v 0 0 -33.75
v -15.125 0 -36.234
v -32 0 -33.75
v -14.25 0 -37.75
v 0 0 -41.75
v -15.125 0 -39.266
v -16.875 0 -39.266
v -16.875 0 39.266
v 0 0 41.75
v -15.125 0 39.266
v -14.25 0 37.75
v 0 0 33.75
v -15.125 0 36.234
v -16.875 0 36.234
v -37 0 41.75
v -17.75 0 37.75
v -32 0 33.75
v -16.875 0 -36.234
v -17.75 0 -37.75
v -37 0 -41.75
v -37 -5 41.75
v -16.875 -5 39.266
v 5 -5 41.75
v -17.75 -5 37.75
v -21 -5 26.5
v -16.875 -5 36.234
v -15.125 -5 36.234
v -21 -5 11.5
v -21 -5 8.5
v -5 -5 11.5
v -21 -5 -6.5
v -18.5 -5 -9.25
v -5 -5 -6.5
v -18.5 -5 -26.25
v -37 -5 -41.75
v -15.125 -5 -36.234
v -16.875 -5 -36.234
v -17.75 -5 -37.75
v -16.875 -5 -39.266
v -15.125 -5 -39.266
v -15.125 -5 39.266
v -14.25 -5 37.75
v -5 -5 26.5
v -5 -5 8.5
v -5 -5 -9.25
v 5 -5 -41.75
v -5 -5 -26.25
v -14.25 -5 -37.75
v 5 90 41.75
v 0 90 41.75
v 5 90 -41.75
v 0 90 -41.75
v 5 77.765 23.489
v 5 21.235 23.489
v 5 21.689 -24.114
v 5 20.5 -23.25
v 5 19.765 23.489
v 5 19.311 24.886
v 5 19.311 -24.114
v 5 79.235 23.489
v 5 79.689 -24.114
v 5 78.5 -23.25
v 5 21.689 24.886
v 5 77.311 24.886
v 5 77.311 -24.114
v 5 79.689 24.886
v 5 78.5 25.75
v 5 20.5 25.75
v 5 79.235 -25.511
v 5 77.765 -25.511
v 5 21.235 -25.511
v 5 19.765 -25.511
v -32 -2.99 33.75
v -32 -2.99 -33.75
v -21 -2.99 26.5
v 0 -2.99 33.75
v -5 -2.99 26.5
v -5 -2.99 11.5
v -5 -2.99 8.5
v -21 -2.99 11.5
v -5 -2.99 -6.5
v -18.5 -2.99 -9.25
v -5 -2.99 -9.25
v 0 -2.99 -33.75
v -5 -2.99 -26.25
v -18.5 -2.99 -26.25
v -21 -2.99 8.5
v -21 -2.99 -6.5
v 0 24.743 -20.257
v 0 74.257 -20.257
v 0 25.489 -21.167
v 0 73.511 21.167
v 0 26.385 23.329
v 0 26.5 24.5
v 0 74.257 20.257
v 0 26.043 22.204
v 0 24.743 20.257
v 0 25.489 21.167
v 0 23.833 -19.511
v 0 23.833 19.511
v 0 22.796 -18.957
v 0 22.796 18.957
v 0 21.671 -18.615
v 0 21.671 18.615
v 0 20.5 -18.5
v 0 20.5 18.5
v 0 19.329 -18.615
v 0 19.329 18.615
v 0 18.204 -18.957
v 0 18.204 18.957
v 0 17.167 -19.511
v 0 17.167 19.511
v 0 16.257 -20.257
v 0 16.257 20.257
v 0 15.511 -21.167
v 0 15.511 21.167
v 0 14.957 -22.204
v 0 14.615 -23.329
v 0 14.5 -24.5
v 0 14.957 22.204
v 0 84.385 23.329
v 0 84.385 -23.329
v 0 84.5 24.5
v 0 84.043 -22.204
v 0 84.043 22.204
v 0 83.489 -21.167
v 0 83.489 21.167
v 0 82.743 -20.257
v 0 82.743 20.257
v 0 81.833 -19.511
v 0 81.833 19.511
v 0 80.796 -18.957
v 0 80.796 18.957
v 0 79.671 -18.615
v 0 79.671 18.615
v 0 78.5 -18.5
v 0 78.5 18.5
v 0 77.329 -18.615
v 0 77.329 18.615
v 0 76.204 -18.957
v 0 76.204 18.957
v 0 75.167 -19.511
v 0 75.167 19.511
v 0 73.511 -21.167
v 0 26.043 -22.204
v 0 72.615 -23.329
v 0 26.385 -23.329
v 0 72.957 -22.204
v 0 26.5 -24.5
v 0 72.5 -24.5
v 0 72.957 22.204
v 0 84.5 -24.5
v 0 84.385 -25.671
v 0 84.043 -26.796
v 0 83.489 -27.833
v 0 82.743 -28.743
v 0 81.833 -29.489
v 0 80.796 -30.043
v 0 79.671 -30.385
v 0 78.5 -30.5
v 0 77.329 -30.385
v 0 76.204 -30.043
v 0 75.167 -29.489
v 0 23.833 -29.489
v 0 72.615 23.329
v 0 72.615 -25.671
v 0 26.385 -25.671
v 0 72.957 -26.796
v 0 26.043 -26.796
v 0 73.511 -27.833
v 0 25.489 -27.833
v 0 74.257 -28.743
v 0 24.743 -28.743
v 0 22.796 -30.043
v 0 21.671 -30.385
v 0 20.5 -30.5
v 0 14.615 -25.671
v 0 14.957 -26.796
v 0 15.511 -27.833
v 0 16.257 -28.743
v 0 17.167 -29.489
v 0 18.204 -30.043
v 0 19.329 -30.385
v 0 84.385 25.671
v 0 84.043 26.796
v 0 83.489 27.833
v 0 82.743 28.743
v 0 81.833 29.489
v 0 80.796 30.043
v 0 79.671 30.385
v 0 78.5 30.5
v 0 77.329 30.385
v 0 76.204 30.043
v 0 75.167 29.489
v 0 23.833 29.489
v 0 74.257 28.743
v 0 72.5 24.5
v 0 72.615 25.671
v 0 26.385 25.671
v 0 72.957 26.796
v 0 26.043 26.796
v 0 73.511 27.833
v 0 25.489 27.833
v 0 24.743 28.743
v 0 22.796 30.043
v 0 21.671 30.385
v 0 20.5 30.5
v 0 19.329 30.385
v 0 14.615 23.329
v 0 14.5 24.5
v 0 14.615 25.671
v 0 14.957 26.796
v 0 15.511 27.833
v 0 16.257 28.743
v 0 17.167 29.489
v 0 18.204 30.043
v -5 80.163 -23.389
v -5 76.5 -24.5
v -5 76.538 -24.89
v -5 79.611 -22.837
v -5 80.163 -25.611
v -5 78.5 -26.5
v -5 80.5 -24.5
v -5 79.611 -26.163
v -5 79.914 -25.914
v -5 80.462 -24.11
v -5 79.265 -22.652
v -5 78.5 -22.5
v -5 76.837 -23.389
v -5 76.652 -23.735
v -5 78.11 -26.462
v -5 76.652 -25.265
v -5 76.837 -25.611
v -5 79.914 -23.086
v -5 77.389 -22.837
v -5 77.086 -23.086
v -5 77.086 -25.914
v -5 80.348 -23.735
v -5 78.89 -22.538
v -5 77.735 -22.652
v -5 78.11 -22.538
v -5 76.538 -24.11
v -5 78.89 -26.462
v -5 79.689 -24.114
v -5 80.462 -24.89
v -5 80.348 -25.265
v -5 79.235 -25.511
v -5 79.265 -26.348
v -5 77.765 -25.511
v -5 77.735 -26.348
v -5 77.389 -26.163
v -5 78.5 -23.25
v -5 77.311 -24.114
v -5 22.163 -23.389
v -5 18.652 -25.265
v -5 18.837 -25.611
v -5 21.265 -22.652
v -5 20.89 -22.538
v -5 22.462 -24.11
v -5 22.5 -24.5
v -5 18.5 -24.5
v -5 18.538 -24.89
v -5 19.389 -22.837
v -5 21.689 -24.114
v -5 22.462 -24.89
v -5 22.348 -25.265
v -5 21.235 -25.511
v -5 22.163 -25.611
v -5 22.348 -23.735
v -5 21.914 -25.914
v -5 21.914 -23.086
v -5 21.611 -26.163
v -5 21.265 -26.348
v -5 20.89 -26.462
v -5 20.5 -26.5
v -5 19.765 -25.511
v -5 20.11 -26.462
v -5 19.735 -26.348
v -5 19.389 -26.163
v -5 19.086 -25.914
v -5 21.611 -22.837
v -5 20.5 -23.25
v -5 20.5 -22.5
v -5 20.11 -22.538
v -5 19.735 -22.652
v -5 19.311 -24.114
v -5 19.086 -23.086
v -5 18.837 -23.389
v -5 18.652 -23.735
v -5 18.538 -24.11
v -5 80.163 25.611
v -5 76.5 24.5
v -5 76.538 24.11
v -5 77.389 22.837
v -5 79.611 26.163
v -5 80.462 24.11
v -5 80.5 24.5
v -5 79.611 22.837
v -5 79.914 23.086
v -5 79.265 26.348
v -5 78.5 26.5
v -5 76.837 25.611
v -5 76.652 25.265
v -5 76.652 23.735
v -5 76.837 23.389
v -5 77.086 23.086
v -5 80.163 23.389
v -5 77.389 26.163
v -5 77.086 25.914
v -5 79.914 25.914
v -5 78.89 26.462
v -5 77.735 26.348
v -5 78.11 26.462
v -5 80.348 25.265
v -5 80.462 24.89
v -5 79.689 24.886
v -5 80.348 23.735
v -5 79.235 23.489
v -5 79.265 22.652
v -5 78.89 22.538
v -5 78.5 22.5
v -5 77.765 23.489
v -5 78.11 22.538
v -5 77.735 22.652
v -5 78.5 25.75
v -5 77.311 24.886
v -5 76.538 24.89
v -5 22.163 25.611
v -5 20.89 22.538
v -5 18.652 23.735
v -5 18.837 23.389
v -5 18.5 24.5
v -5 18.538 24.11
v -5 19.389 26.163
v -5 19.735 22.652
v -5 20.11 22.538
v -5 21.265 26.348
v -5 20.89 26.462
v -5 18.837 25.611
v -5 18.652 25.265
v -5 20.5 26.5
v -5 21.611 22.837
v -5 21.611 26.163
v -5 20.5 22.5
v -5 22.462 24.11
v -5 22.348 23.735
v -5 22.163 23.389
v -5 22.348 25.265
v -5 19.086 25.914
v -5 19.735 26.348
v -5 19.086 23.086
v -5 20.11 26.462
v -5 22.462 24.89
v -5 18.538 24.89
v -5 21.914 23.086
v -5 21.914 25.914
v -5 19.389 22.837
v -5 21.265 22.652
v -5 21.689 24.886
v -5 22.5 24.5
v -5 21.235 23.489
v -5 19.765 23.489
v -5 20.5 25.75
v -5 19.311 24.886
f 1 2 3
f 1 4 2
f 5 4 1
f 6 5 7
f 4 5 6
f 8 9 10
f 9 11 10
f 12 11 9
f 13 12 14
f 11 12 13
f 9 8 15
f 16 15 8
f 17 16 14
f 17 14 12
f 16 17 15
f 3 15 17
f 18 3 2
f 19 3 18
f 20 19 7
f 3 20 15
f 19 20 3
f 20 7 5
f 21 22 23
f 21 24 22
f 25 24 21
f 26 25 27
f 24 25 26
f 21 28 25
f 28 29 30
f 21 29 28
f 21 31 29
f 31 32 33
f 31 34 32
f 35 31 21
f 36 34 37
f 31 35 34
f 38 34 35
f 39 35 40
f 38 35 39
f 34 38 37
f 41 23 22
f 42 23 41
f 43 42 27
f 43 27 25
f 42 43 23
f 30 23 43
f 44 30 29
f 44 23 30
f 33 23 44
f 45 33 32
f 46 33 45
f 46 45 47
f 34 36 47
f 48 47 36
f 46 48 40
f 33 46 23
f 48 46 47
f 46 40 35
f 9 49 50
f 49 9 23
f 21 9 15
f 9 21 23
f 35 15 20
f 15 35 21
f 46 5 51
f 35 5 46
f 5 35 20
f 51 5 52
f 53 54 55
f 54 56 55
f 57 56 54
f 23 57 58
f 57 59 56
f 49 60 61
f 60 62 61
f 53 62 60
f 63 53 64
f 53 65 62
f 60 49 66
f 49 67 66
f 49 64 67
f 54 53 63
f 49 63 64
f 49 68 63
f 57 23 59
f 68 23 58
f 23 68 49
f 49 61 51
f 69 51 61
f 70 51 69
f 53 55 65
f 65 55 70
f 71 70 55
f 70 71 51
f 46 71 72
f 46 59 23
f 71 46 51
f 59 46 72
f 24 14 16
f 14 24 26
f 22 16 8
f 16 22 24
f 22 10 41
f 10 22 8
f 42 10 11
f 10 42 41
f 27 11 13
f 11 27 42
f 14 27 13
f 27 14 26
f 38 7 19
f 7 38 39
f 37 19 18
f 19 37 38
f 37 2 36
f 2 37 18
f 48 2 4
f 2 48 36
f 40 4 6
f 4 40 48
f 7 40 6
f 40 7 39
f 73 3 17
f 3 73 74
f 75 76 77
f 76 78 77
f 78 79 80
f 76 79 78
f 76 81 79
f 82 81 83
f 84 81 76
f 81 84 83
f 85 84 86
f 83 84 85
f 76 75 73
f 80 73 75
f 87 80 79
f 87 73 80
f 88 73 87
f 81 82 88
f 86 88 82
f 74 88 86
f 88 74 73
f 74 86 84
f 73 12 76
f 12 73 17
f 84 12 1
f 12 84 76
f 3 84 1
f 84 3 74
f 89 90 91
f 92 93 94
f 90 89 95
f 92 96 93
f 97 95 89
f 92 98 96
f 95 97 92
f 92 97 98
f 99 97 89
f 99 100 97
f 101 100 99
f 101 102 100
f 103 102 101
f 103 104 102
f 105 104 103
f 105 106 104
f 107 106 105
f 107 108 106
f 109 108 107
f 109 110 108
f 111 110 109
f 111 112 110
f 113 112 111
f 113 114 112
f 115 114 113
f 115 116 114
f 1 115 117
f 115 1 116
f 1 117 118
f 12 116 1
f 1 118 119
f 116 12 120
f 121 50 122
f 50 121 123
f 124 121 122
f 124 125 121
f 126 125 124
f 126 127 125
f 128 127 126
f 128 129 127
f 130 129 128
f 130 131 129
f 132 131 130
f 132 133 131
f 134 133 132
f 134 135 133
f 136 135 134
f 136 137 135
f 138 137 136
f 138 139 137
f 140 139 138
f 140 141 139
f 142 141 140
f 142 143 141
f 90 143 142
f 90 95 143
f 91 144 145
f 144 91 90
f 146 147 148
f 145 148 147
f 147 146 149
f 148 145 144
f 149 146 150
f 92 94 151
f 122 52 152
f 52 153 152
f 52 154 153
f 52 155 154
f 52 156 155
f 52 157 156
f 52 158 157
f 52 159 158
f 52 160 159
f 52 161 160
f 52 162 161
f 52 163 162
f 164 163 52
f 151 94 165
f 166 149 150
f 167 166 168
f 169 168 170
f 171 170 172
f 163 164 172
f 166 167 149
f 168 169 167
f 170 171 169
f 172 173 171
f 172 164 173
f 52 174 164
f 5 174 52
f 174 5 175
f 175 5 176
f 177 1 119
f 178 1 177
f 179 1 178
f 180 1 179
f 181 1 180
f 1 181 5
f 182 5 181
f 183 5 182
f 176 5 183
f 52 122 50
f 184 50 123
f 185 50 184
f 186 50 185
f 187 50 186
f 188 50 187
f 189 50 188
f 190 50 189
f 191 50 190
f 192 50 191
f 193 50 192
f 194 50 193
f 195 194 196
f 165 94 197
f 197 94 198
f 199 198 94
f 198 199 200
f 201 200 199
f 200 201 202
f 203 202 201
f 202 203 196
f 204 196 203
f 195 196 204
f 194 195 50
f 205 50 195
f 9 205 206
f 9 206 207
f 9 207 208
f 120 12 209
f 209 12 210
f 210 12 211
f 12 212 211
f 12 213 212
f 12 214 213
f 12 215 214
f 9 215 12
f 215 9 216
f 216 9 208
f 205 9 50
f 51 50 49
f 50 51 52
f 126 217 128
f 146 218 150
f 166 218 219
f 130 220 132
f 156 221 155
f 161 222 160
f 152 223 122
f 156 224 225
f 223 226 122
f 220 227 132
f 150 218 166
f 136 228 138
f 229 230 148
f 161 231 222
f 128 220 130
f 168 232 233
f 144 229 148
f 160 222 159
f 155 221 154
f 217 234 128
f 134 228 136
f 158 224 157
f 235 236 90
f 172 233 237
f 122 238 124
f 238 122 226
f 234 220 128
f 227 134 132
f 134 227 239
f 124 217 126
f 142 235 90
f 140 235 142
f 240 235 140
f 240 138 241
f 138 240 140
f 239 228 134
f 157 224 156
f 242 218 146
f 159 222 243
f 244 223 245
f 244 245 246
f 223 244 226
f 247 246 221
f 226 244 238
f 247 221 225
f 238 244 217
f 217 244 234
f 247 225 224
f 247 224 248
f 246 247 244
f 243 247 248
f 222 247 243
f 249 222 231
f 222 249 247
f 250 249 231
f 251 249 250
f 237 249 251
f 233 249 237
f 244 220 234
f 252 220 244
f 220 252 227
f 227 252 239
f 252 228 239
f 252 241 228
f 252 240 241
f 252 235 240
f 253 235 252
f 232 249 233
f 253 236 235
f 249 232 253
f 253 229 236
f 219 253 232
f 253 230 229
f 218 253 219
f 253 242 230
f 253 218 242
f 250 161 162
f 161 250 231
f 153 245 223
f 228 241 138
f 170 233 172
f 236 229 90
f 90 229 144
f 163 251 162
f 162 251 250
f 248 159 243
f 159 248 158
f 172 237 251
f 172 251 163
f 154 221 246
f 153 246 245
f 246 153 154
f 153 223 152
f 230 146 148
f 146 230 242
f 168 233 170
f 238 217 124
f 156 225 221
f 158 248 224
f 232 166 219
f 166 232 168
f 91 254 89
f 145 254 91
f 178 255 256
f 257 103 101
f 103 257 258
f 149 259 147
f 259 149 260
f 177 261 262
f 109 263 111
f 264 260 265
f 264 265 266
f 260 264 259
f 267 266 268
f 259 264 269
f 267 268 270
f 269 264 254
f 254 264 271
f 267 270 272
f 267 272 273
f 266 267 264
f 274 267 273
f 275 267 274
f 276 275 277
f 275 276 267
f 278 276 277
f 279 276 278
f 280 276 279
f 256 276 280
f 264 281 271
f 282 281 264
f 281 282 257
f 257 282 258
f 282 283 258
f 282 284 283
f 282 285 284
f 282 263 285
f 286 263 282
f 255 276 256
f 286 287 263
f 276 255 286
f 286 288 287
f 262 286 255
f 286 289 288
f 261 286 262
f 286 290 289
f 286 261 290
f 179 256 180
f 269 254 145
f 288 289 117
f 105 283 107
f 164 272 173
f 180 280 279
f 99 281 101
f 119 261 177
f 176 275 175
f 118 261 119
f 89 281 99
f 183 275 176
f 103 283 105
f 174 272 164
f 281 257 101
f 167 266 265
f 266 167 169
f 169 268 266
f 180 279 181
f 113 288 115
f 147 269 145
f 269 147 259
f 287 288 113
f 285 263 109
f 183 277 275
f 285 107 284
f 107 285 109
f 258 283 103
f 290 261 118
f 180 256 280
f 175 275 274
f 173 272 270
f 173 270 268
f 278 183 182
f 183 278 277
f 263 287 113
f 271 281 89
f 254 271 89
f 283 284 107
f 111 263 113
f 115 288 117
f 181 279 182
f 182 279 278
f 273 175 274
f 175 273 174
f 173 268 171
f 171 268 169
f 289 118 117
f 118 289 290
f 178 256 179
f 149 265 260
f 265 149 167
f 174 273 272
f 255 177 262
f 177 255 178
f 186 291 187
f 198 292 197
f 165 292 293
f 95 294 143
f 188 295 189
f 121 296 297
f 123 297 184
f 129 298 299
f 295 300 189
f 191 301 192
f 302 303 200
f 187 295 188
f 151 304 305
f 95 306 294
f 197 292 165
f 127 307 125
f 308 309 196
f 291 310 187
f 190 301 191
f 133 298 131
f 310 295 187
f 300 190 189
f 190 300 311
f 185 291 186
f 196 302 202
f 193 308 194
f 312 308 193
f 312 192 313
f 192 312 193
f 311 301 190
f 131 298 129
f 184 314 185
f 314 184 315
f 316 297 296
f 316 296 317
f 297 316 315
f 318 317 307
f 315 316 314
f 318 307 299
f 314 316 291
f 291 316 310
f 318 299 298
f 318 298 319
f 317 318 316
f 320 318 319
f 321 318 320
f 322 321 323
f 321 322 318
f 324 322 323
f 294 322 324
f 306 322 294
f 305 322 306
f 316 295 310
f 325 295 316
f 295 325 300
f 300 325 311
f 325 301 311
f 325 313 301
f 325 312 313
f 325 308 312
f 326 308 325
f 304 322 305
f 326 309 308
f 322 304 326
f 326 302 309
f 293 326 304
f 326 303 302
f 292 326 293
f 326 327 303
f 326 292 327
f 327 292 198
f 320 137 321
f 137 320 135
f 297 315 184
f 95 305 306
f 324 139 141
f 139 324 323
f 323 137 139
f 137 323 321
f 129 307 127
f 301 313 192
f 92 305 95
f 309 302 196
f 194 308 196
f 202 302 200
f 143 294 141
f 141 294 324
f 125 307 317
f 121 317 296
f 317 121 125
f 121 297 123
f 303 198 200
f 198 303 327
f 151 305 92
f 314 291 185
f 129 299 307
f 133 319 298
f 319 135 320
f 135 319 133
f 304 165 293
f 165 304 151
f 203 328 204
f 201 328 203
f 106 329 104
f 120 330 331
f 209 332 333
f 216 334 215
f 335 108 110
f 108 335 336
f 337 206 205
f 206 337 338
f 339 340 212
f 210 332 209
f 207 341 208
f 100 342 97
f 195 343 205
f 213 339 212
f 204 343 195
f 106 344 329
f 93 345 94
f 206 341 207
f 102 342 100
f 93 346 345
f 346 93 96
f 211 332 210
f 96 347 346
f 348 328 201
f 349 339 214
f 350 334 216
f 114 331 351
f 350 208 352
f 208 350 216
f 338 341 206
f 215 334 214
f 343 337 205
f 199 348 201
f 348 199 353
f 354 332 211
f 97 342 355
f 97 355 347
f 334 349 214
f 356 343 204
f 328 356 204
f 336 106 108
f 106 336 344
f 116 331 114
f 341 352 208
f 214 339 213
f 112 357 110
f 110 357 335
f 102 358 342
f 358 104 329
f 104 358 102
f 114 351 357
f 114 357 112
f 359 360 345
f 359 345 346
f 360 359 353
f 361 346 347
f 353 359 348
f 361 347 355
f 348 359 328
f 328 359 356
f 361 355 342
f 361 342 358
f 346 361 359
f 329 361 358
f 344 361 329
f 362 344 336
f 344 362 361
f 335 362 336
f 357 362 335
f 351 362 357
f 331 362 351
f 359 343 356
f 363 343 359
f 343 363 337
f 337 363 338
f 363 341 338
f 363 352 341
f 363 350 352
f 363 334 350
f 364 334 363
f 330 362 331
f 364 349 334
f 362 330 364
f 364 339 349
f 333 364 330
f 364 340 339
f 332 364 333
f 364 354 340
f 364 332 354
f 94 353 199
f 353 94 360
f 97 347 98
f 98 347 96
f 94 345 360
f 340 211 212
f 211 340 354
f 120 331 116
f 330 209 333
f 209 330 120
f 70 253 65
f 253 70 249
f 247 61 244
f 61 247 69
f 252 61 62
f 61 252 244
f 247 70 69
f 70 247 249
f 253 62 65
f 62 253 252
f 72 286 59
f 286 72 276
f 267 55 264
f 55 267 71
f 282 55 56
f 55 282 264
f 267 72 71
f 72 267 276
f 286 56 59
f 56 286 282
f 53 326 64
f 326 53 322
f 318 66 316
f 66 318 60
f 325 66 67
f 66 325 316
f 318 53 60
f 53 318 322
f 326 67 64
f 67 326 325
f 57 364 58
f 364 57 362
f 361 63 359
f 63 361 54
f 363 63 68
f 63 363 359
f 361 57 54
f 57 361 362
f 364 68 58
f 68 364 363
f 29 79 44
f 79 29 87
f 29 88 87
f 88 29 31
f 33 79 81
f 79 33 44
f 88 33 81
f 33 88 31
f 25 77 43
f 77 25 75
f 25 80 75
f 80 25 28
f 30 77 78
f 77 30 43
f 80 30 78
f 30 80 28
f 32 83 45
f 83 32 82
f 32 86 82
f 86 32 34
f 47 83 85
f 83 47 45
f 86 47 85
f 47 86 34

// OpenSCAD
// file: blank.scad
include <common.scad>

module Blank(front_thickness=5, recess_size=[segment_width - 10, segment_height - 16], recess_depth=3)
{
  color("red")
  {
    rotate([90, 0, 0])
    {
      difference()
      {
        linear_extrude(front_thickness)
        {
          FrontProjection();
        }

        translate([0, 0, -0.01])
        {
          linear_extrude(recess_depth)
          {
            square(recess_size, center=true);
          }
        }
      }
    }
  }
}

Blank();
// file: common.scad
segment_width = 42;
segment_height = 83.5;

mounting_hole_centres = 75.5;
mounting_hole_diameter = 3.5;

module FrontProjection()
{
  difference()
  {
    square([segment_width, segment_height], center=true);

    for(y = [-mounting_hole_centres/2, mounting_hole_centres/2])
    {
      translate([0, y])
      {
        circle(d=mounting_hole_diameter);
      }
    }
  }
}

module Standoff(lower_diameter, upper_diameter, height)
{
  hull()
  {
    translate([0, 0, -1])
    {
      cylinder(d=lower_diameter, h=1, $fn=32);
    }

    translate([0, 0, height - 1])
    {
      cylinder(d=upper_diameter, h=1, $fn=32);
    }
  }
}
// file: blank_with_mounting_plate.scad
include <common.scad>
use <blank.scad>

module BlankWithMountingPlate(front_thickness=5, plate_thickness=5, plate_depth=120, recess_size=[segment_width - 10, segment_height - 16], recess_depth=3)
{
  translate([-(segment_width / 2) + plate_thickness, 0, 0])
  {
    Blank(front_thickness, recess_size, recess_depth);
  }

  color("green")
  {
    translate([plate_thickness / 2, 0, 0])
    {
      rotate([-90, 0, 0])
      {
        linear_extrude(plate_depth)
        {
          square([plate_thickness, segment_height], center=true);
        }
      }
    }
  }
}

BlankWithMountingPlate();
// main file
use <blank_with_mounting_plate.scad>

board_size = [56, 85];
front_panel_recess = 3;

module PlaceMountingHoles()
{
  translate([-board_size[0]/2, -front_panel_recess])
  {
    translate([3.5, board_size[1] - 3.5])
    {
      for(x = [0, 49])
      {
        for(y = [0, -58])
        {
          translate([x, y])
          {
            children();
          }
        }
      }
    }
  }
}

module RaspberyPi3B()
{
  board_offset = 5;

  difference()
  {
    union()
    {
      BlankWithMountingPlate(plate_depth=90, recess_depth=front_panel_recess);

      /* Board standoffs */
      color("cyan")
      {
        rotate([0, -90, 0])
        {
          PlaceMountingHoles()
          {
            Standoff(12, 4, board_offset);
          }
        }
      }
    }

    /* Board mounting holes */
    rotate([0, -90, 0])
    {
      PlaceMountingHoles()
      {
        cylinder(d=2.5, h=50, center=true);
      }
    }

    /* Port cutouts */
    translate([-board_offset, 0, 0])
    {
      rotate([0, -90, 0])
      {
        translate([-board_size[0] / 2, 0, 0])
        {
          /* Ethernet */
          translate([10.25, 0, 13.5 / 2])
          {
            cube([17, 20, 13.5], center=true);
          }

          /* USB */
          for(x = [29, 47])
          {
            translate([x, 0, 16 / 2])
            {
              cube([15, 20, 16], center=true);
            }
          }
        }
      }
    }
  }
}

RaspberyPi3B();
